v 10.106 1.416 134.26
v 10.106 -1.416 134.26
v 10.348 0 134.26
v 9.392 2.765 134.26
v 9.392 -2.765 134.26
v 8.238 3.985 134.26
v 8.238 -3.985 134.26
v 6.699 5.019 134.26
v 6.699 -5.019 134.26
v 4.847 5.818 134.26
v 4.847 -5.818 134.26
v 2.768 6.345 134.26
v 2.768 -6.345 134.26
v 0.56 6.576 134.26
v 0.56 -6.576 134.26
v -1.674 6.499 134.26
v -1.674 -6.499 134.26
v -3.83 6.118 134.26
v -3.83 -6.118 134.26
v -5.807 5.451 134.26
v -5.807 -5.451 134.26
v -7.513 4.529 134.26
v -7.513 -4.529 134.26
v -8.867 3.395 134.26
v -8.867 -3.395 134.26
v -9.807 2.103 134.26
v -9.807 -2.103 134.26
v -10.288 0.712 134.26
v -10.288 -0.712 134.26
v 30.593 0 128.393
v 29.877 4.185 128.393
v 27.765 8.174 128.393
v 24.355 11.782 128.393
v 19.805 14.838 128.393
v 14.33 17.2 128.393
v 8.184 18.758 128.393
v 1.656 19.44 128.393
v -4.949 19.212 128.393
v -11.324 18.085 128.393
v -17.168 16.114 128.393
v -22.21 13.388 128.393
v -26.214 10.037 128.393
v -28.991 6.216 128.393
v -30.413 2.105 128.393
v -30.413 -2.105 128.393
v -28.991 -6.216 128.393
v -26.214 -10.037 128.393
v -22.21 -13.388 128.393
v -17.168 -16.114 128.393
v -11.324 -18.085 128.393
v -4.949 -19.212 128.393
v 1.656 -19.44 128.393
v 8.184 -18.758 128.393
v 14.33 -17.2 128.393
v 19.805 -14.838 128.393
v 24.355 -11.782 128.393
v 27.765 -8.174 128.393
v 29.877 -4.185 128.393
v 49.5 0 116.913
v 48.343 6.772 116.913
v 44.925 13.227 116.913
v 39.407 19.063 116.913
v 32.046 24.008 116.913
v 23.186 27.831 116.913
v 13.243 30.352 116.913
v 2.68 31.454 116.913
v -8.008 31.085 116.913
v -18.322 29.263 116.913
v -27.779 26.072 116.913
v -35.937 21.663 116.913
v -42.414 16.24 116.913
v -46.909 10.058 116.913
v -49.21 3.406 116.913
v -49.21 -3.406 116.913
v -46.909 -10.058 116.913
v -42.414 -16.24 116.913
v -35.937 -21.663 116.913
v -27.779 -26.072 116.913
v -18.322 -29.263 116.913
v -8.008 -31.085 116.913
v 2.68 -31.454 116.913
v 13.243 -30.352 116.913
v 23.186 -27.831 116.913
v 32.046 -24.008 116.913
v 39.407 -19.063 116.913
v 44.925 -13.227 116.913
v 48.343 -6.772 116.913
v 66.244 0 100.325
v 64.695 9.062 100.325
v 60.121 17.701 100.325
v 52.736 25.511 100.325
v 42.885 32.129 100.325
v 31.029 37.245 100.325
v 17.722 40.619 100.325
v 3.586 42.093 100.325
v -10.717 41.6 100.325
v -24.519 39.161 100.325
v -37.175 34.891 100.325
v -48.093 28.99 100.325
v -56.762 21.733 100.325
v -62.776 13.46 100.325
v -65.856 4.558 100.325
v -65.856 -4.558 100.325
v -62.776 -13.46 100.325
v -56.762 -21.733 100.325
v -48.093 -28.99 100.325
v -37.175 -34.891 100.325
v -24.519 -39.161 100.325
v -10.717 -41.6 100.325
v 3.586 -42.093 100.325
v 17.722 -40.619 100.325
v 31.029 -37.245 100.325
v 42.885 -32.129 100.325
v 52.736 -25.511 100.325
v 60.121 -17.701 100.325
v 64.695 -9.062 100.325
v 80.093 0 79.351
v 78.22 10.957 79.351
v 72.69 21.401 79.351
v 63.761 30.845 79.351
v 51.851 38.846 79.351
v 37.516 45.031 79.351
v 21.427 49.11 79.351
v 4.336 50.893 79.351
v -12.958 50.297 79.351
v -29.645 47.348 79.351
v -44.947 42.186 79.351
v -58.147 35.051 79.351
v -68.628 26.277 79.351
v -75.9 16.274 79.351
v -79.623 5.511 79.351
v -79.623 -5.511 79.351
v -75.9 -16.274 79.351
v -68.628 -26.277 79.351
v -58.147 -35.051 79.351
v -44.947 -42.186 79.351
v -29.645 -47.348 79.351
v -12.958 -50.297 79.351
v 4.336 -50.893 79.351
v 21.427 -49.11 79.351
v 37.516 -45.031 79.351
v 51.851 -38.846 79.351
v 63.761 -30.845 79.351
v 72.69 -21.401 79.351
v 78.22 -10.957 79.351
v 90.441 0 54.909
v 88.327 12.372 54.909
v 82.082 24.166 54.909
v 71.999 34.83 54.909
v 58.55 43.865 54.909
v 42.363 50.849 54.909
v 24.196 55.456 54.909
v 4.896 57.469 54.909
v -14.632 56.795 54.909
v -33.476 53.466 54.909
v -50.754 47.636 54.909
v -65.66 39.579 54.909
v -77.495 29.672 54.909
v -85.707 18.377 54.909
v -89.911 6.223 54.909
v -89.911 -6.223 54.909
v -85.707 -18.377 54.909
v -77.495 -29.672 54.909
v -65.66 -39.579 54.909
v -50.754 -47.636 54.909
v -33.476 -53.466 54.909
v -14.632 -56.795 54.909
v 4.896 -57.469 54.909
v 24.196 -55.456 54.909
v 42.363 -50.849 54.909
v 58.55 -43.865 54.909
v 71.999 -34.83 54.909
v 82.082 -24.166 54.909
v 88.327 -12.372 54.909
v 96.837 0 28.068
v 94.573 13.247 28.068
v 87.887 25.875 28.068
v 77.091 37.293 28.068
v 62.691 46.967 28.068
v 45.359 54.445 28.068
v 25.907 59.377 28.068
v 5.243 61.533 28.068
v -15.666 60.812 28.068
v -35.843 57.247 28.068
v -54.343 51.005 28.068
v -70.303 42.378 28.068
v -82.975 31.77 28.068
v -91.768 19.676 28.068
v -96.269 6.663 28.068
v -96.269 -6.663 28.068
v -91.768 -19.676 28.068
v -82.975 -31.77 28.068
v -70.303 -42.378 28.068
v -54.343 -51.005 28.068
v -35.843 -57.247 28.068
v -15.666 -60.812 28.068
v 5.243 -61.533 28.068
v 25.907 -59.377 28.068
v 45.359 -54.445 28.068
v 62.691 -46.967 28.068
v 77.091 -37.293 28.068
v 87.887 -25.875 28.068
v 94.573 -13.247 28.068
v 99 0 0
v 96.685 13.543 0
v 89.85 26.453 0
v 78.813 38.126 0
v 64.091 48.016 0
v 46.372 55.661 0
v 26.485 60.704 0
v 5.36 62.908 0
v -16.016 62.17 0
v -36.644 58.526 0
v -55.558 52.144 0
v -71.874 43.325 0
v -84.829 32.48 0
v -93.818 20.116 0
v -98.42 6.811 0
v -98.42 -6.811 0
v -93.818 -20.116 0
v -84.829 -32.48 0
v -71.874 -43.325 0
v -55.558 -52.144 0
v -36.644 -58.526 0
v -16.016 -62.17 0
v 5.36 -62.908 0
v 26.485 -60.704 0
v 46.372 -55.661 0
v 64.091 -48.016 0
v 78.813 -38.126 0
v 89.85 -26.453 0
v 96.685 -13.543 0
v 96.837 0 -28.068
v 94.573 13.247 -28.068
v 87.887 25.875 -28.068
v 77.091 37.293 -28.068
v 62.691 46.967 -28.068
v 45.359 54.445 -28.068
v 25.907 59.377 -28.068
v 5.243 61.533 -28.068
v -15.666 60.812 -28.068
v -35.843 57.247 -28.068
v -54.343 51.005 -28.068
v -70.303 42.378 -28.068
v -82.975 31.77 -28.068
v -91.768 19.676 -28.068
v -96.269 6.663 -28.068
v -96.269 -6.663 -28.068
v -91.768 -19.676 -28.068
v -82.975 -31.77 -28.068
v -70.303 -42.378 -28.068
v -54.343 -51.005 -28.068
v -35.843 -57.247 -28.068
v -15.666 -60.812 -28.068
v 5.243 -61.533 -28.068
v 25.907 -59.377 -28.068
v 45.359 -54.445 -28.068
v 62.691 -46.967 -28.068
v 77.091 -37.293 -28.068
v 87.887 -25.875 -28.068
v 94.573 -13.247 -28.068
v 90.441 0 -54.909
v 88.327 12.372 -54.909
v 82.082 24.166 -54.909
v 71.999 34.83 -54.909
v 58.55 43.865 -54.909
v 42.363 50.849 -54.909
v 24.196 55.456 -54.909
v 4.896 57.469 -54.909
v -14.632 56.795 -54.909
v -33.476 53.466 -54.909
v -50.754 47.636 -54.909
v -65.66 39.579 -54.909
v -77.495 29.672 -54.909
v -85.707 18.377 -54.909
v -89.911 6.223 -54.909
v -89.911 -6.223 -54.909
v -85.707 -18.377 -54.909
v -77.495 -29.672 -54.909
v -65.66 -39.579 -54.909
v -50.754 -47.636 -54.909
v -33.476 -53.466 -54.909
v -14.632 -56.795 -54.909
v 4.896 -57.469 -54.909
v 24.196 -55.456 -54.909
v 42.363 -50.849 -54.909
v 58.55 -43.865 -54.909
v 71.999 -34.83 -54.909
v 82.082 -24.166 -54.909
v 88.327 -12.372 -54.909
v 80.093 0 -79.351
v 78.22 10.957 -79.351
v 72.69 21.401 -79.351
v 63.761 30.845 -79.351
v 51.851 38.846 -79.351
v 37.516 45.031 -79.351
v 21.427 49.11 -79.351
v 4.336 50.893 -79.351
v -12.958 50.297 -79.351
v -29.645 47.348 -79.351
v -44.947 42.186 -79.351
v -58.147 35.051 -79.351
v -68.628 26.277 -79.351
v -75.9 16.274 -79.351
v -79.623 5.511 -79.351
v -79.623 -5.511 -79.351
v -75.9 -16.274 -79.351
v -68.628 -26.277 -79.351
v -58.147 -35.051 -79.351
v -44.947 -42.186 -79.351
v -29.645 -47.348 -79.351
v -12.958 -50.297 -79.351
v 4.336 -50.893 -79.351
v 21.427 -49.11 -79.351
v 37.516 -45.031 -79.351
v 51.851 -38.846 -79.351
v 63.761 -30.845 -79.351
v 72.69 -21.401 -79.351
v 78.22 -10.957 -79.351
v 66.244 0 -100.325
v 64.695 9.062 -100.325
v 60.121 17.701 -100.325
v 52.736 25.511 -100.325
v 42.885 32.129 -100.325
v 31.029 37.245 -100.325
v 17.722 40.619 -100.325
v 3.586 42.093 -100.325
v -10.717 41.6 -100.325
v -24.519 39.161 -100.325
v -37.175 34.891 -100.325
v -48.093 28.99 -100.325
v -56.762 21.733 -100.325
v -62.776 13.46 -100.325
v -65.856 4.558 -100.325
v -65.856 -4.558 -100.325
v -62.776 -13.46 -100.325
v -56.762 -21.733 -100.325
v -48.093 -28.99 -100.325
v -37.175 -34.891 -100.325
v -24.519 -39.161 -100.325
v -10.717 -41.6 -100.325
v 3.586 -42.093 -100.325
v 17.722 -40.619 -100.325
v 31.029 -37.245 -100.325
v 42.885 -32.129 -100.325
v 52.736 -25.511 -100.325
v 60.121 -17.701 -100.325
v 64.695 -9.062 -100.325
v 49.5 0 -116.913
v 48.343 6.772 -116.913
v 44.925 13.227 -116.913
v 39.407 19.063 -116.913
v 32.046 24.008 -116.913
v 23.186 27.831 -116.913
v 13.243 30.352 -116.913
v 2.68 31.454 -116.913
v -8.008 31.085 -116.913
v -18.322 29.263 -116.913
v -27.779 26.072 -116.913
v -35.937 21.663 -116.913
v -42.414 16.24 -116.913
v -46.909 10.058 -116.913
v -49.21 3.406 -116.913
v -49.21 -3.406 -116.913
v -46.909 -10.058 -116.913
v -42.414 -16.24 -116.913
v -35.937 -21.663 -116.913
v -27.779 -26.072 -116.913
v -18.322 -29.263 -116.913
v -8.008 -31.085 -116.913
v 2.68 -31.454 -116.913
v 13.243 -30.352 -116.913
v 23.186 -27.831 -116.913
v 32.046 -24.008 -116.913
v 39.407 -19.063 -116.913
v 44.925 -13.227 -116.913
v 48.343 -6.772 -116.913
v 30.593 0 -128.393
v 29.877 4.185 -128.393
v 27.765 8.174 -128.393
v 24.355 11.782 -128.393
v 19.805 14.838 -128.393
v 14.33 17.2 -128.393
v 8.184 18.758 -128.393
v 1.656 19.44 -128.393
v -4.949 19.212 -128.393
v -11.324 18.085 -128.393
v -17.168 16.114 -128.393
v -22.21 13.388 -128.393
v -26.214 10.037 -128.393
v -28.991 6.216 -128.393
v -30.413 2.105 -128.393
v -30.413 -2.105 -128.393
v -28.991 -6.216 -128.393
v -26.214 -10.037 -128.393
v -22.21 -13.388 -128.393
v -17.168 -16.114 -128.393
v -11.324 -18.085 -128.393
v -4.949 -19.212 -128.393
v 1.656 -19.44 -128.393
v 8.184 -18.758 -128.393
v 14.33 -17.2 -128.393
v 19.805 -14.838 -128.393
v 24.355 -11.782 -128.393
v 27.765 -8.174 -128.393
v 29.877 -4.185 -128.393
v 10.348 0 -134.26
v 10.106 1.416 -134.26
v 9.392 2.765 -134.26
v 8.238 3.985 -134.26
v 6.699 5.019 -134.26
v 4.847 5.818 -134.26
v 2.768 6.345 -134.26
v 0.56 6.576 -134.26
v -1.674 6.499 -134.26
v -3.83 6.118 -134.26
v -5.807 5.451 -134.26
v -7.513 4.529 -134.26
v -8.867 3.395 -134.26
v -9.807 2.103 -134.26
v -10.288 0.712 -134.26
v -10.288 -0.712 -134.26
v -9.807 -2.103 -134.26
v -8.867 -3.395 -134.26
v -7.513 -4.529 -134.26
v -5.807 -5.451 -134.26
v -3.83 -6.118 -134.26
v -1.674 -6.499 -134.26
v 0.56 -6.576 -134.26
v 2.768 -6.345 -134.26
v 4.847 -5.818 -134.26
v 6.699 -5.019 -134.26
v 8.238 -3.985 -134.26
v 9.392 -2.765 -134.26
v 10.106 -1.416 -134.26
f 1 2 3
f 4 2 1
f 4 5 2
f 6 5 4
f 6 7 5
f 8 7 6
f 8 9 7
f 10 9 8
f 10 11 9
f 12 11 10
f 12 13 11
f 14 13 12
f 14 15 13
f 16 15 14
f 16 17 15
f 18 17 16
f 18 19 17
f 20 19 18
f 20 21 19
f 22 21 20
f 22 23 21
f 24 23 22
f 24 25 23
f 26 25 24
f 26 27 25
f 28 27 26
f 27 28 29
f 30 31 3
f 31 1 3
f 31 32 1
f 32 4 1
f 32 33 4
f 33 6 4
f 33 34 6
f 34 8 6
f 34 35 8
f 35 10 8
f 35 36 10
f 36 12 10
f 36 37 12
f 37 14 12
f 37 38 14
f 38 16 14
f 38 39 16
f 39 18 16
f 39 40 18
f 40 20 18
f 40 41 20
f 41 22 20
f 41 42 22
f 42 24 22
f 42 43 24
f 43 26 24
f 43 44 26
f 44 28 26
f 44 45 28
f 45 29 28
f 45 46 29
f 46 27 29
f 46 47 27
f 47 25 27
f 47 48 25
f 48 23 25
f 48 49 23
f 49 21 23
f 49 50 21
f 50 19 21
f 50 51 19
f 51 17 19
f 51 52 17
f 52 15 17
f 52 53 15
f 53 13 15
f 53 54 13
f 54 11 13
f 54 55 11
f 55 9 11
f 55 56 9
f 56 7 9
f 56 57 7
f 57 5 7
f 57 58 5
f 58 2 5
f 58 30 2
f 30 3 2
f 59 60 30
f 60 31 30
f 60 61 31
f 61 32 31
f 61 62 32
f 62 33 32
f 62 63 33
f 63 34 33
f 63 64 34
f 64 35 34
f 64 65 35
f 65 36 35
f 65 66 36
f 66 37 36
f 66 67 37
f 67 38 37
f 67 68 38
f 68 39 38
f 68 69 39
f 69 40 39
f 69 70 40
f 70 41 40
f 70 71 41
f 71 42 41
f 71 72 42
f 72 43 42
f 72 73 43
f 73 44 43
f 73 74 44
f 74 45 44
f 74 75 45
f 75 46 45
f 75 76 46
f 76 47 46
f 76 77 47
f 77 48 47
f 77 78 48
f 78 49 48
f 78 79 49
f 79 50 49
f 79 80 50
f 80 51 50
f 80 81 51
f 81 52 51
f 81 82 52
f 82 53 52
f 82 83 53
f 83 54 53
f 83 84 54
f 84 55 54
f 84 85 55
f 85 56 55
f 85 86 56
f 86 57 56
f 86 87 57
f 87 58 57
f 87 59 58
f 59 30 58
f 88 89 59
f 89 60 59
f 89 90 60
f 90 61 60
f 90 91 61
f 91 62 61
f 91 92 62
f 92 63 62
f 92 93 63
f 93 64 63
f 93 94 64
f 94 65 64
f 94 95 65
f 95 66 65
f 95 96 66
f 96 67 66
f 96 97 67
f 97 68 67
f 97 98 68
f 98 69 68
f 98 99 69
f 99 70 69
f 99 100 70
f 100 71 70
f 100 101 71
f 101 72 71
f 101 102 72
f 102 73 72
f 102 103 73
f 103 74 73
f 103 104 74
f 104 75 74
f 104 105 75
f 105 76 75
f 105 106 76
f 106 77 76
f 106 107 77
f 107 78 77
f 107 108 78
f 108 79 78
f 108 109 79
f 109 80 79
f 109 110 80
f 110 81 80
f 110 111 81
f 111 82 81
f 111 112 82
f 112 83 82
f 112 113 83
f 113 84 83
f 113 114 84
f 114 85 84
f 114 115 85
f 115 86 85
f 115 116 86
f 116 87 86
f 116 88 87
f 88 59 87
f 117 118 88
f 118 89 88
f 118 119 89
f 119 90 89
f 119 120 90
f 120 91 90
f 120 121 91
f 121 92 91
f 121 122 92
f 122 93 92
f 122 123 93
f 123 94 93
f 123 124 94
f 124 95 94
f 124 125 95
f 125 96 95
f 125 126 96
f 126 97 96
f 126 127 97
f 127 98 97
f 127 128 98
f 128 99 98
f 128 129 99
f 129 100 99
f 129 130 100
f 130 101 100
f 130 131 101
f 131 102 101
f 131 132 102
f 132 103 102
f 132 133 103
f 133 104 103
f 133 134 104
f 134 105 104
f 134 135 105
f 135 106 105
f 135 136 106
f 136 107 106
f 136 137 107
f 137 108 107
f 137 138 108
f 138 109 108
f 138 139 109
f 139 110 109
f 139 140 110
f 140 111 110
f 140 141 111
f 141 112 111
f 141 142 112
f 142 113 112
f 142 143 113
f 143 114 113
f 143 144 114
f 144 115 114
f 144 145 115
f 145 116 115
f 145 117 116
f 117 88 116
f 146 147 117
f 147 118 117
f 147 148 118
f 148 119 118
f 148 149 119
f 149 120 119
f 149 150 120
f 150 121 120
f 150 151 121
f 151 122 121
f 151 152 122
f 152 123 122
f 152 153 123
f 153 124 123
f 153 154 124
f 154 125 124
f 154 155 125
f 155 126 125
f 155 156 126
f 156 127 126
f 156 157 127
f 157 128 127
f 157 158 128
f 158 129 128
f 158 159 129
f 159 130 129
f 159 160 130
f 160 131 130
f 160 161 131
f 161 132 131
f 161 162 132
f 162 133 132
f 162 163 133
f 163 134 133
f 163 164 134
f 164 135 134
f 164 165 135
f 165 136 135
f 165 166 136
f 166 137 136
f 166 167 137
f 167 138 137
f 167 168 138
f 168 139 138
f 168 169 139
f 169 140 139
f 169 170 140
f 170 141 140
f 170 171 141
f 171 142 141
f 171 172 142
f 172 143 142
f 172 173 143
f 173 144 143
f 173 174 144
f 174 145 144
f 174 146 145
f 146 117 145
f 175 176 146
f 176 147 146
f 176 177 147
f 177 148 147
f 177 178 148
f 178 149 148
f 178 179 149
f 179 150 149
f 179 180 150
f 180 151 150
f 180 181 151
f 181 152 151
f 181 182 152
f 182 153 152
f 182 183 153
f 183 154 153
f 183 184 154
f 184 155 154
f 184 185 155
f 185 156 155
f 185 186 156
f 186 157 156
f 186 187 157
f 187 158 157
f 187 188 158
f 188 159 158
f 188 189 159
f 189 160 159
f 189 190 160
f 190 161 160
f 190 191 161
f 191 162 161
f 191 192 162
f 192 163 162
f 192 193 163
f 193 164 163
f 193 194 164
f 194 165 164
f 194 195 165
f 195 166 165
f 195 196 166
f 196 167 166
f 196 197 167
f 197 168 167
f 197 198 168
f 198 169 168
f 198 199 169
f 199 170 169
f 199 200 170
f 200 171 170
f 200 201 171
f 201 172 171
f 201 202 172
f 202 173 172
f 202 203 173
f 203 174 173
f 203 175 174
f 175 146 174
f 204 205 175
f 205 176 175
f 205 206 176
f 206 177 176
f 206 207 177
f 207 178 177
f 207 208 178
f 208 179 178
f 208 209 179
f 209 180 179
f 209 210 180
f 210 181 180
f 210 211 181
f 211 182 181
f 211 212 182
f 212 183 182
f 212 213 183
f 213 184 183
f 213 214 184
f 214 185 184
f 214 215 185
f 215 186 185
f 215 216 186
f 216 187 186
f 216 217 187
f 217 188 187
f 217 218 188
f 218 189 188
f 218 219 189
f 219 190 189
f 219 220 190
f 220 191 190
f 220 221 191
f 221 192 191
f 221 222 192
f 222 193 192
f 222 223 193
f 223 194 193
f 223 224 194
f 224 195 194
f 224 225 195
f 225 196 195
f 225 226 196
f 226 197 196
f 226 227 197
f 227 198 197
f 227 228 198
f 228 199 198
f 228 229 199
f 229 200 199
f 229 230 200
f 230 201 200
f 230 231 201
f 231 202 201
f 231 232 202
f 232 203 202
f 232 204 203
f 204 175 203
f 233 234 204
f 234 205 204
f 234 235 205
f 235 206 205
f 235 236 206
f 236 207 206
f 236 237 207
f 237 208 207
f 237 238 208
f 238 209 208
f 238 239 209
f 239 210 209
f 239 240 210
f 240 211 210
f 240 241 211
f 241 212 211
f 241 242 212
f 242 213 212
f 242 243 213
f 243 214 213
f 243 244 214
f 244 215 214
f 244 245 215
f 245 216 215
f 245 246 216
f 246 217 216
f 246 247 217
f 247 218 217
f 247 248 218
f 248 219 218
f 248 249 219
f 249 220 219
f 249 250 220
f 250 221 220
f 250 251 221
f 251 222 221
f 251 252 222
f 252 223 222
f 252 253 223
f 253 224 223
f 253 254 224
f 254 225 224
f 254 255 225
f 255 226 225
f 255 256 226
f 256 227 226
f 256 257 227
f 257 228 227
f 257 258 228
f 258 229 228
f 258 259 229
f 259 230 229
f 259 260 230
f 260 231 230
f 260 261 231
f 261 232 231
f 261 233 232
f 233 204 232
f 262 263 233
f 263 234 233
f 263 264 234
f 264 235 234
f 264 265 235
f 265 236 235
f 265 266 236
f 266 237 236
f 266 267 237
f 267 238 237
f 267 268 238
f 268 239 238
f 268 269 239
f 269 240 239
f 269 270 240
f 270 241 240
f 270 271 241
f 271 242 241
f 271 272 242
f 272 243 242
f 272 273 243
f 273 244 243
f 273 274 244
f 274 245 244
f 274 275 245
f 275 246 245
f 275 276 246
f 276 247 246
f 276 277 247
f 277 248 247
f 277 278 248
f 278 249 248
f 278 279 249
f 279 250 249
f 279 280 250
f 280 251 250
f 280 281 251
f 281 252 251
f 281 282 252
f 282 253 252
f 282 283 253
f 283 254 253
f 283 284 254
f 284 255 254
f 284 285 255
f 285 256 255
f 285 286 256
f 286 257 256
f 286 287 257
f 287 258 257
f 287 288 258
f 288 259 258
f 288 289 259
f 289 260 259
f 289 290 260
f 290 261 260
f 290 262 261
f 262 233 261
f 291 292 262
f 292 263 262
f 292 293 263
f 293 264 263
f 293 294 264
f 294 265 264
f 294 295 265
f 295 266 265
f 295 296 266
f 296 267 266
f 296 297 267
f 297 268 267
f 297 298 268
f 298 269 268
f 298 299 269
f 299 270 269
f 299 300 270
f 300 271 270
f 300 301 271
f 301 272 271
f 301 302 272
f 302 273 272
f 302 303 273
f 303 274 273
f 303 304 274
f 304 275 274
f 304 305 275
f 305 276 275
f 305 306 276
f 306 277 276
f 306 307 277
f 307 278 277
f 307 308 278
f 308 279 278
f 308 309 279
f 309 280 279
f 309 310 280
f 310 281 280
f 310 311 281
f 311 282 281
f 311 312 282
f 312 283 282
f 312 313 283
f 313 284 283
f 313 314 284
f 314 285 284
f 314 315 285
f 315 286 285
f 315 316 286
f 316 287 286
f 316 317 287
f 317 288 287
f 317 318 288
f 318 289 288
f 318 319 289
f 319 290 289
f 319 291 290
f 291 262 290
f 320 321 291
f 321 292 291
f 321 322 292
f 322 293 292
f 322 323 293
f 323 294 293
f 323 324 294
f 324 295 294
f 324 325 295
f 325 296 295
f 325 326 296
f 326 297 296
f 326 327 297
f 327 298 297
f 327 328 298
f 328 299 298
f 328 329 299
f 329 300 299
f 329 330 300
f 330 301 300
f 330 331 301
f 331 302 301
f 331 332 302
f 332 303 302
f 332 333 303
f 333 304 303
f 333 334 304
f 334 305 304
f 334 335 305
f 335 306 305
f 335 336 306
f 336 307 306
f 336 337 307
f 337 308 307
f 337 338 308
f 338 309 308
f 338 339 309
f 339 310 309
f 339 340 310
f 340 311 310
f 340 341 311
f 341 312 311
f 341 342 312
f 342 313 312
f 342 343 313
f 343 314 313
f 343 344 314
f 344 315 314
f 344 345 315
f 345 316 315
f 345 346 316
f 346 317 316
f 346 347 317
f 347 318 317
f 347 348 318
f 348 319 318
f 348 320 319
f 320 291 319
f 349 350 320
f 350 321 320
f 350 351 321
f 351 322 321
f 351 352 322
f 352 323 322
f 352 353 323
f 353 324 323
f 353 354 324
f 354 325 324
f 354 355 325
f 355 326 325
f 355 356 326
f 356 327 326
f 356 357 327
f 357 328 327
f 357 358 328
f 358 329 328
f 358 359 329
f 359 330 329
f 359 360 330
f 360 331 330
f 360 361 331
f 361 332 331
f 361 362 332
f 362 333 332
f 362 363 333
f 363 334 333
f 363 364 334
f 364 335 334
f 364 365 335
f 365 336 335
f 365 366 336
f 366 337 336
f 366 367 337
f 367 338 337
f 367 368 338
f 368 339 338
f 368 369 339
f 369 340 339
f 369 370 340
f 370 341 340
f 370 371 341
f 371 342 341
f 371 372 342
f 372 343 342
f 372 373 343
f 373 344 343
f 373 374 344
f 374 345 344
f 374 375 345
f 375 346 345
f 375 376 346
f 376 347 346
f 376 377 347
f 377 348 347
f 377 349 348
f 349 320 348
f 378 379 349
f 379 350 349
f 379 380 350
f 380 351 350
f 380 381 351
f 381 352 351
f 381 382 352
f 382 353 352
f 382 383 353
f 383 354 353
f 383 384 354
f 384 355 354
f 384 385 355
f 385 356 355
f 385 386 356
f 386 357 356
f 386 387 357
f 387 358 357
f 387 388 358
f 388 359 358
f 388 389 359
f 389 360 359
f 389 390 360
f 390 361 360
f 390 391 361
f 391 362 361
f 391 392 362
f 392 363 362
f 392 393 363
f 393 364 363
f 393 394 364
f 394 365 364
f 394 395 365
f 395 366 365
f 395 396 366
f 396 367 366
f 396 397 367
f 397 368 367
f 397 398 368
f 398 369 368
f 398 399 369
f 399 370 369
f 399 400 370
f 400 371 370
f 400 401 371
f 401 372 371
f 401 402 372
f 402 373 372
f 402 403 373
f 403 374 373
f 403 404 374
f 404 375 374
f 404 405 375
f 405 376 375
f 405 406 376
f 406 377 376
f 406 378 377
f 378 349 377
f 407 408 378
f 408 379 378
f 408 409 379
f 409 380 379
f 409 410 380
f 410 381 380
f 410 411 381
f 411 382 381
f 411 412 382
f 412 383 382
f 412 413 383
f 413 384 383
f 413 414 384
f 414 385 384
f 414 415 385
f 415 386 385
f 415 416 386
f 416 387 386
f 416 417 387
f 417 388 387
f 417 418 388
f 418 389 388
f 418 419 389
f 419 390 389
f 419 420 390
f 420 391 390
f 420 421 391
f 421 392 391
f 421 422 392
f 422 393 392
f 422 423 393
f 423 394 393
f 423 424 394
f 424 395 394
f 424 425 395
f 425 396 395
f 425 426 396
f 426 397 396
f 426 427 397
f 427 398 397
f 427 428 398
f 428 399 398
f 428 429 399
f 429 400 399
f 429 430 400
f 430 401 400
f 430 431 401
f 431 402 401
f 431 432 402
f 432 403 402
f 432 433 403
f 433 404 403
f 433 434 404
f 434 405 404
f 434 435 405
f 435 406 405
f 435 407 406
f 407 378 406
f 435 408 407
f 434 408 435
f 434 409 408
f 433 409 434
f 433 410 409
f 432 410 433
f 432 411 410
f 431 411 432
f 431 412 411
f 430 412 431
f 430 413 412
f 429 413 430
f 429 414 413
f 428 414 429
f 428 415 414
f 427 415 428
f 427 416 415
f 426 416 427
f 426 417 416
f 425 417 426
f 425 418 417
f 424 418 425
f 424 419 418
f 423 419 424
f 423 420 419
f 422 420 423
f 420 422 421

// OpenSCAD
// Generated by SolidPython 1.0.1 on 2020-07-29 00:46:49


scale(v = [11, 7, 15]) {
	sphere(r = 9);
}
/***********************************************
*********      SolidPython code:      **********
************************************************
 
# import packages: SolidPython
from solid import *
from solid.utils import *
from itertools import chain, combinations, permutations


class Resize:

    def __init__(self, scad_file):
        self.scad_file = scad_file
        #self.scad_file = import_scad(scad_file)
        # cone/cylinder param:
        self.r1 = 0
        self.r2 = 0
        self.h = 0
        # rectangular prism param:
        self.w = 0
        self.l = 0
        # ellipse param:
        self.r = 0

    # import OpenScad code (file name corresponds to shape)


    # classify shape + parameters
    def assign(self, param1, param2, param3):
        if self.scad_file == 'cone.scad':
            self.r1 = param1
            self.r2 = param2
            self.h = param3
        elif self.scad_file == 'cylinder.scad':
            self.r1 = param1
            self.r2 = param2
            self.h = param3
        elif self.scad_file == 'rectangularPrism.scad':
            self.h = param1
            self.l = param2
            self.w = param3
        else:
            self.r = param1
            self.h = param2

    # resize parameters
    def iterate(self):
        x = range(3, 20, 2)
        i = 1
        if self.scad_file == 'cone.scad':
            tempList = list(permutations(x, 2))
            for temp in tempList:
                param1 = temp[0]
                param2 = temp[1]
                filepath = 'produced_scad_files/' + 'cone' + str(param1) + '_' + str(param2) + '_' + '.scad'
                scad_render_to_file(cylinder(h=param1, r1=param2, r2=0), filepath)

        elif self.scad_file == 'cylinder.scad':
            tempList = list(permutations(x, 3))
            for temp in tempList:
                param1 = temp[0]
                param2 = temp[1]
                filepath = 'produced_scad_files/' + 'cylinder' + str(param1) + '_' + str(param2) + '_' + '.scad'
                scad_render_to_file(cylinder(h=param1, r1=param2, r2=param2), filepath)

        elif self.scad_file == 'rectangularPrism.scad':
            tempList = list(permutations(x, 3))
            for temp in tempList:
                param1 = temp[0]
                param2 = temp[1]
                param3 = temp[2]
                filepath = 'produced_scad_files/' + 'rectangularPrism' + str(param1) + '_' + str(param2) + '_' + str(
                    param3) + '.scad'
                scad_render_to_file(cube(size=(param1, param2, param3)), filepath)

        elif self.scad_file == 'ellipse.scad':
            tempList = list(permutations(x, 4))
            for temp in tempList:
                param1 = temp[0]
                param2 = temp[1]
                param3 = temp[2]
                param4 = temp[3]
                filepath = 'produced_scad_files/' + 'ellipse' + str(param1) + '_' + str(param2) + '_' + str(param3) + '_' + str(param4) + '.scad'
                scad_render_to_file(scale([param1, param2, param3])(sphere(r=param4)), filepath)

    def render_to_scadfile(self):
        scad_render_to_file(scad, 'example.scad') 
 
************************************************/
